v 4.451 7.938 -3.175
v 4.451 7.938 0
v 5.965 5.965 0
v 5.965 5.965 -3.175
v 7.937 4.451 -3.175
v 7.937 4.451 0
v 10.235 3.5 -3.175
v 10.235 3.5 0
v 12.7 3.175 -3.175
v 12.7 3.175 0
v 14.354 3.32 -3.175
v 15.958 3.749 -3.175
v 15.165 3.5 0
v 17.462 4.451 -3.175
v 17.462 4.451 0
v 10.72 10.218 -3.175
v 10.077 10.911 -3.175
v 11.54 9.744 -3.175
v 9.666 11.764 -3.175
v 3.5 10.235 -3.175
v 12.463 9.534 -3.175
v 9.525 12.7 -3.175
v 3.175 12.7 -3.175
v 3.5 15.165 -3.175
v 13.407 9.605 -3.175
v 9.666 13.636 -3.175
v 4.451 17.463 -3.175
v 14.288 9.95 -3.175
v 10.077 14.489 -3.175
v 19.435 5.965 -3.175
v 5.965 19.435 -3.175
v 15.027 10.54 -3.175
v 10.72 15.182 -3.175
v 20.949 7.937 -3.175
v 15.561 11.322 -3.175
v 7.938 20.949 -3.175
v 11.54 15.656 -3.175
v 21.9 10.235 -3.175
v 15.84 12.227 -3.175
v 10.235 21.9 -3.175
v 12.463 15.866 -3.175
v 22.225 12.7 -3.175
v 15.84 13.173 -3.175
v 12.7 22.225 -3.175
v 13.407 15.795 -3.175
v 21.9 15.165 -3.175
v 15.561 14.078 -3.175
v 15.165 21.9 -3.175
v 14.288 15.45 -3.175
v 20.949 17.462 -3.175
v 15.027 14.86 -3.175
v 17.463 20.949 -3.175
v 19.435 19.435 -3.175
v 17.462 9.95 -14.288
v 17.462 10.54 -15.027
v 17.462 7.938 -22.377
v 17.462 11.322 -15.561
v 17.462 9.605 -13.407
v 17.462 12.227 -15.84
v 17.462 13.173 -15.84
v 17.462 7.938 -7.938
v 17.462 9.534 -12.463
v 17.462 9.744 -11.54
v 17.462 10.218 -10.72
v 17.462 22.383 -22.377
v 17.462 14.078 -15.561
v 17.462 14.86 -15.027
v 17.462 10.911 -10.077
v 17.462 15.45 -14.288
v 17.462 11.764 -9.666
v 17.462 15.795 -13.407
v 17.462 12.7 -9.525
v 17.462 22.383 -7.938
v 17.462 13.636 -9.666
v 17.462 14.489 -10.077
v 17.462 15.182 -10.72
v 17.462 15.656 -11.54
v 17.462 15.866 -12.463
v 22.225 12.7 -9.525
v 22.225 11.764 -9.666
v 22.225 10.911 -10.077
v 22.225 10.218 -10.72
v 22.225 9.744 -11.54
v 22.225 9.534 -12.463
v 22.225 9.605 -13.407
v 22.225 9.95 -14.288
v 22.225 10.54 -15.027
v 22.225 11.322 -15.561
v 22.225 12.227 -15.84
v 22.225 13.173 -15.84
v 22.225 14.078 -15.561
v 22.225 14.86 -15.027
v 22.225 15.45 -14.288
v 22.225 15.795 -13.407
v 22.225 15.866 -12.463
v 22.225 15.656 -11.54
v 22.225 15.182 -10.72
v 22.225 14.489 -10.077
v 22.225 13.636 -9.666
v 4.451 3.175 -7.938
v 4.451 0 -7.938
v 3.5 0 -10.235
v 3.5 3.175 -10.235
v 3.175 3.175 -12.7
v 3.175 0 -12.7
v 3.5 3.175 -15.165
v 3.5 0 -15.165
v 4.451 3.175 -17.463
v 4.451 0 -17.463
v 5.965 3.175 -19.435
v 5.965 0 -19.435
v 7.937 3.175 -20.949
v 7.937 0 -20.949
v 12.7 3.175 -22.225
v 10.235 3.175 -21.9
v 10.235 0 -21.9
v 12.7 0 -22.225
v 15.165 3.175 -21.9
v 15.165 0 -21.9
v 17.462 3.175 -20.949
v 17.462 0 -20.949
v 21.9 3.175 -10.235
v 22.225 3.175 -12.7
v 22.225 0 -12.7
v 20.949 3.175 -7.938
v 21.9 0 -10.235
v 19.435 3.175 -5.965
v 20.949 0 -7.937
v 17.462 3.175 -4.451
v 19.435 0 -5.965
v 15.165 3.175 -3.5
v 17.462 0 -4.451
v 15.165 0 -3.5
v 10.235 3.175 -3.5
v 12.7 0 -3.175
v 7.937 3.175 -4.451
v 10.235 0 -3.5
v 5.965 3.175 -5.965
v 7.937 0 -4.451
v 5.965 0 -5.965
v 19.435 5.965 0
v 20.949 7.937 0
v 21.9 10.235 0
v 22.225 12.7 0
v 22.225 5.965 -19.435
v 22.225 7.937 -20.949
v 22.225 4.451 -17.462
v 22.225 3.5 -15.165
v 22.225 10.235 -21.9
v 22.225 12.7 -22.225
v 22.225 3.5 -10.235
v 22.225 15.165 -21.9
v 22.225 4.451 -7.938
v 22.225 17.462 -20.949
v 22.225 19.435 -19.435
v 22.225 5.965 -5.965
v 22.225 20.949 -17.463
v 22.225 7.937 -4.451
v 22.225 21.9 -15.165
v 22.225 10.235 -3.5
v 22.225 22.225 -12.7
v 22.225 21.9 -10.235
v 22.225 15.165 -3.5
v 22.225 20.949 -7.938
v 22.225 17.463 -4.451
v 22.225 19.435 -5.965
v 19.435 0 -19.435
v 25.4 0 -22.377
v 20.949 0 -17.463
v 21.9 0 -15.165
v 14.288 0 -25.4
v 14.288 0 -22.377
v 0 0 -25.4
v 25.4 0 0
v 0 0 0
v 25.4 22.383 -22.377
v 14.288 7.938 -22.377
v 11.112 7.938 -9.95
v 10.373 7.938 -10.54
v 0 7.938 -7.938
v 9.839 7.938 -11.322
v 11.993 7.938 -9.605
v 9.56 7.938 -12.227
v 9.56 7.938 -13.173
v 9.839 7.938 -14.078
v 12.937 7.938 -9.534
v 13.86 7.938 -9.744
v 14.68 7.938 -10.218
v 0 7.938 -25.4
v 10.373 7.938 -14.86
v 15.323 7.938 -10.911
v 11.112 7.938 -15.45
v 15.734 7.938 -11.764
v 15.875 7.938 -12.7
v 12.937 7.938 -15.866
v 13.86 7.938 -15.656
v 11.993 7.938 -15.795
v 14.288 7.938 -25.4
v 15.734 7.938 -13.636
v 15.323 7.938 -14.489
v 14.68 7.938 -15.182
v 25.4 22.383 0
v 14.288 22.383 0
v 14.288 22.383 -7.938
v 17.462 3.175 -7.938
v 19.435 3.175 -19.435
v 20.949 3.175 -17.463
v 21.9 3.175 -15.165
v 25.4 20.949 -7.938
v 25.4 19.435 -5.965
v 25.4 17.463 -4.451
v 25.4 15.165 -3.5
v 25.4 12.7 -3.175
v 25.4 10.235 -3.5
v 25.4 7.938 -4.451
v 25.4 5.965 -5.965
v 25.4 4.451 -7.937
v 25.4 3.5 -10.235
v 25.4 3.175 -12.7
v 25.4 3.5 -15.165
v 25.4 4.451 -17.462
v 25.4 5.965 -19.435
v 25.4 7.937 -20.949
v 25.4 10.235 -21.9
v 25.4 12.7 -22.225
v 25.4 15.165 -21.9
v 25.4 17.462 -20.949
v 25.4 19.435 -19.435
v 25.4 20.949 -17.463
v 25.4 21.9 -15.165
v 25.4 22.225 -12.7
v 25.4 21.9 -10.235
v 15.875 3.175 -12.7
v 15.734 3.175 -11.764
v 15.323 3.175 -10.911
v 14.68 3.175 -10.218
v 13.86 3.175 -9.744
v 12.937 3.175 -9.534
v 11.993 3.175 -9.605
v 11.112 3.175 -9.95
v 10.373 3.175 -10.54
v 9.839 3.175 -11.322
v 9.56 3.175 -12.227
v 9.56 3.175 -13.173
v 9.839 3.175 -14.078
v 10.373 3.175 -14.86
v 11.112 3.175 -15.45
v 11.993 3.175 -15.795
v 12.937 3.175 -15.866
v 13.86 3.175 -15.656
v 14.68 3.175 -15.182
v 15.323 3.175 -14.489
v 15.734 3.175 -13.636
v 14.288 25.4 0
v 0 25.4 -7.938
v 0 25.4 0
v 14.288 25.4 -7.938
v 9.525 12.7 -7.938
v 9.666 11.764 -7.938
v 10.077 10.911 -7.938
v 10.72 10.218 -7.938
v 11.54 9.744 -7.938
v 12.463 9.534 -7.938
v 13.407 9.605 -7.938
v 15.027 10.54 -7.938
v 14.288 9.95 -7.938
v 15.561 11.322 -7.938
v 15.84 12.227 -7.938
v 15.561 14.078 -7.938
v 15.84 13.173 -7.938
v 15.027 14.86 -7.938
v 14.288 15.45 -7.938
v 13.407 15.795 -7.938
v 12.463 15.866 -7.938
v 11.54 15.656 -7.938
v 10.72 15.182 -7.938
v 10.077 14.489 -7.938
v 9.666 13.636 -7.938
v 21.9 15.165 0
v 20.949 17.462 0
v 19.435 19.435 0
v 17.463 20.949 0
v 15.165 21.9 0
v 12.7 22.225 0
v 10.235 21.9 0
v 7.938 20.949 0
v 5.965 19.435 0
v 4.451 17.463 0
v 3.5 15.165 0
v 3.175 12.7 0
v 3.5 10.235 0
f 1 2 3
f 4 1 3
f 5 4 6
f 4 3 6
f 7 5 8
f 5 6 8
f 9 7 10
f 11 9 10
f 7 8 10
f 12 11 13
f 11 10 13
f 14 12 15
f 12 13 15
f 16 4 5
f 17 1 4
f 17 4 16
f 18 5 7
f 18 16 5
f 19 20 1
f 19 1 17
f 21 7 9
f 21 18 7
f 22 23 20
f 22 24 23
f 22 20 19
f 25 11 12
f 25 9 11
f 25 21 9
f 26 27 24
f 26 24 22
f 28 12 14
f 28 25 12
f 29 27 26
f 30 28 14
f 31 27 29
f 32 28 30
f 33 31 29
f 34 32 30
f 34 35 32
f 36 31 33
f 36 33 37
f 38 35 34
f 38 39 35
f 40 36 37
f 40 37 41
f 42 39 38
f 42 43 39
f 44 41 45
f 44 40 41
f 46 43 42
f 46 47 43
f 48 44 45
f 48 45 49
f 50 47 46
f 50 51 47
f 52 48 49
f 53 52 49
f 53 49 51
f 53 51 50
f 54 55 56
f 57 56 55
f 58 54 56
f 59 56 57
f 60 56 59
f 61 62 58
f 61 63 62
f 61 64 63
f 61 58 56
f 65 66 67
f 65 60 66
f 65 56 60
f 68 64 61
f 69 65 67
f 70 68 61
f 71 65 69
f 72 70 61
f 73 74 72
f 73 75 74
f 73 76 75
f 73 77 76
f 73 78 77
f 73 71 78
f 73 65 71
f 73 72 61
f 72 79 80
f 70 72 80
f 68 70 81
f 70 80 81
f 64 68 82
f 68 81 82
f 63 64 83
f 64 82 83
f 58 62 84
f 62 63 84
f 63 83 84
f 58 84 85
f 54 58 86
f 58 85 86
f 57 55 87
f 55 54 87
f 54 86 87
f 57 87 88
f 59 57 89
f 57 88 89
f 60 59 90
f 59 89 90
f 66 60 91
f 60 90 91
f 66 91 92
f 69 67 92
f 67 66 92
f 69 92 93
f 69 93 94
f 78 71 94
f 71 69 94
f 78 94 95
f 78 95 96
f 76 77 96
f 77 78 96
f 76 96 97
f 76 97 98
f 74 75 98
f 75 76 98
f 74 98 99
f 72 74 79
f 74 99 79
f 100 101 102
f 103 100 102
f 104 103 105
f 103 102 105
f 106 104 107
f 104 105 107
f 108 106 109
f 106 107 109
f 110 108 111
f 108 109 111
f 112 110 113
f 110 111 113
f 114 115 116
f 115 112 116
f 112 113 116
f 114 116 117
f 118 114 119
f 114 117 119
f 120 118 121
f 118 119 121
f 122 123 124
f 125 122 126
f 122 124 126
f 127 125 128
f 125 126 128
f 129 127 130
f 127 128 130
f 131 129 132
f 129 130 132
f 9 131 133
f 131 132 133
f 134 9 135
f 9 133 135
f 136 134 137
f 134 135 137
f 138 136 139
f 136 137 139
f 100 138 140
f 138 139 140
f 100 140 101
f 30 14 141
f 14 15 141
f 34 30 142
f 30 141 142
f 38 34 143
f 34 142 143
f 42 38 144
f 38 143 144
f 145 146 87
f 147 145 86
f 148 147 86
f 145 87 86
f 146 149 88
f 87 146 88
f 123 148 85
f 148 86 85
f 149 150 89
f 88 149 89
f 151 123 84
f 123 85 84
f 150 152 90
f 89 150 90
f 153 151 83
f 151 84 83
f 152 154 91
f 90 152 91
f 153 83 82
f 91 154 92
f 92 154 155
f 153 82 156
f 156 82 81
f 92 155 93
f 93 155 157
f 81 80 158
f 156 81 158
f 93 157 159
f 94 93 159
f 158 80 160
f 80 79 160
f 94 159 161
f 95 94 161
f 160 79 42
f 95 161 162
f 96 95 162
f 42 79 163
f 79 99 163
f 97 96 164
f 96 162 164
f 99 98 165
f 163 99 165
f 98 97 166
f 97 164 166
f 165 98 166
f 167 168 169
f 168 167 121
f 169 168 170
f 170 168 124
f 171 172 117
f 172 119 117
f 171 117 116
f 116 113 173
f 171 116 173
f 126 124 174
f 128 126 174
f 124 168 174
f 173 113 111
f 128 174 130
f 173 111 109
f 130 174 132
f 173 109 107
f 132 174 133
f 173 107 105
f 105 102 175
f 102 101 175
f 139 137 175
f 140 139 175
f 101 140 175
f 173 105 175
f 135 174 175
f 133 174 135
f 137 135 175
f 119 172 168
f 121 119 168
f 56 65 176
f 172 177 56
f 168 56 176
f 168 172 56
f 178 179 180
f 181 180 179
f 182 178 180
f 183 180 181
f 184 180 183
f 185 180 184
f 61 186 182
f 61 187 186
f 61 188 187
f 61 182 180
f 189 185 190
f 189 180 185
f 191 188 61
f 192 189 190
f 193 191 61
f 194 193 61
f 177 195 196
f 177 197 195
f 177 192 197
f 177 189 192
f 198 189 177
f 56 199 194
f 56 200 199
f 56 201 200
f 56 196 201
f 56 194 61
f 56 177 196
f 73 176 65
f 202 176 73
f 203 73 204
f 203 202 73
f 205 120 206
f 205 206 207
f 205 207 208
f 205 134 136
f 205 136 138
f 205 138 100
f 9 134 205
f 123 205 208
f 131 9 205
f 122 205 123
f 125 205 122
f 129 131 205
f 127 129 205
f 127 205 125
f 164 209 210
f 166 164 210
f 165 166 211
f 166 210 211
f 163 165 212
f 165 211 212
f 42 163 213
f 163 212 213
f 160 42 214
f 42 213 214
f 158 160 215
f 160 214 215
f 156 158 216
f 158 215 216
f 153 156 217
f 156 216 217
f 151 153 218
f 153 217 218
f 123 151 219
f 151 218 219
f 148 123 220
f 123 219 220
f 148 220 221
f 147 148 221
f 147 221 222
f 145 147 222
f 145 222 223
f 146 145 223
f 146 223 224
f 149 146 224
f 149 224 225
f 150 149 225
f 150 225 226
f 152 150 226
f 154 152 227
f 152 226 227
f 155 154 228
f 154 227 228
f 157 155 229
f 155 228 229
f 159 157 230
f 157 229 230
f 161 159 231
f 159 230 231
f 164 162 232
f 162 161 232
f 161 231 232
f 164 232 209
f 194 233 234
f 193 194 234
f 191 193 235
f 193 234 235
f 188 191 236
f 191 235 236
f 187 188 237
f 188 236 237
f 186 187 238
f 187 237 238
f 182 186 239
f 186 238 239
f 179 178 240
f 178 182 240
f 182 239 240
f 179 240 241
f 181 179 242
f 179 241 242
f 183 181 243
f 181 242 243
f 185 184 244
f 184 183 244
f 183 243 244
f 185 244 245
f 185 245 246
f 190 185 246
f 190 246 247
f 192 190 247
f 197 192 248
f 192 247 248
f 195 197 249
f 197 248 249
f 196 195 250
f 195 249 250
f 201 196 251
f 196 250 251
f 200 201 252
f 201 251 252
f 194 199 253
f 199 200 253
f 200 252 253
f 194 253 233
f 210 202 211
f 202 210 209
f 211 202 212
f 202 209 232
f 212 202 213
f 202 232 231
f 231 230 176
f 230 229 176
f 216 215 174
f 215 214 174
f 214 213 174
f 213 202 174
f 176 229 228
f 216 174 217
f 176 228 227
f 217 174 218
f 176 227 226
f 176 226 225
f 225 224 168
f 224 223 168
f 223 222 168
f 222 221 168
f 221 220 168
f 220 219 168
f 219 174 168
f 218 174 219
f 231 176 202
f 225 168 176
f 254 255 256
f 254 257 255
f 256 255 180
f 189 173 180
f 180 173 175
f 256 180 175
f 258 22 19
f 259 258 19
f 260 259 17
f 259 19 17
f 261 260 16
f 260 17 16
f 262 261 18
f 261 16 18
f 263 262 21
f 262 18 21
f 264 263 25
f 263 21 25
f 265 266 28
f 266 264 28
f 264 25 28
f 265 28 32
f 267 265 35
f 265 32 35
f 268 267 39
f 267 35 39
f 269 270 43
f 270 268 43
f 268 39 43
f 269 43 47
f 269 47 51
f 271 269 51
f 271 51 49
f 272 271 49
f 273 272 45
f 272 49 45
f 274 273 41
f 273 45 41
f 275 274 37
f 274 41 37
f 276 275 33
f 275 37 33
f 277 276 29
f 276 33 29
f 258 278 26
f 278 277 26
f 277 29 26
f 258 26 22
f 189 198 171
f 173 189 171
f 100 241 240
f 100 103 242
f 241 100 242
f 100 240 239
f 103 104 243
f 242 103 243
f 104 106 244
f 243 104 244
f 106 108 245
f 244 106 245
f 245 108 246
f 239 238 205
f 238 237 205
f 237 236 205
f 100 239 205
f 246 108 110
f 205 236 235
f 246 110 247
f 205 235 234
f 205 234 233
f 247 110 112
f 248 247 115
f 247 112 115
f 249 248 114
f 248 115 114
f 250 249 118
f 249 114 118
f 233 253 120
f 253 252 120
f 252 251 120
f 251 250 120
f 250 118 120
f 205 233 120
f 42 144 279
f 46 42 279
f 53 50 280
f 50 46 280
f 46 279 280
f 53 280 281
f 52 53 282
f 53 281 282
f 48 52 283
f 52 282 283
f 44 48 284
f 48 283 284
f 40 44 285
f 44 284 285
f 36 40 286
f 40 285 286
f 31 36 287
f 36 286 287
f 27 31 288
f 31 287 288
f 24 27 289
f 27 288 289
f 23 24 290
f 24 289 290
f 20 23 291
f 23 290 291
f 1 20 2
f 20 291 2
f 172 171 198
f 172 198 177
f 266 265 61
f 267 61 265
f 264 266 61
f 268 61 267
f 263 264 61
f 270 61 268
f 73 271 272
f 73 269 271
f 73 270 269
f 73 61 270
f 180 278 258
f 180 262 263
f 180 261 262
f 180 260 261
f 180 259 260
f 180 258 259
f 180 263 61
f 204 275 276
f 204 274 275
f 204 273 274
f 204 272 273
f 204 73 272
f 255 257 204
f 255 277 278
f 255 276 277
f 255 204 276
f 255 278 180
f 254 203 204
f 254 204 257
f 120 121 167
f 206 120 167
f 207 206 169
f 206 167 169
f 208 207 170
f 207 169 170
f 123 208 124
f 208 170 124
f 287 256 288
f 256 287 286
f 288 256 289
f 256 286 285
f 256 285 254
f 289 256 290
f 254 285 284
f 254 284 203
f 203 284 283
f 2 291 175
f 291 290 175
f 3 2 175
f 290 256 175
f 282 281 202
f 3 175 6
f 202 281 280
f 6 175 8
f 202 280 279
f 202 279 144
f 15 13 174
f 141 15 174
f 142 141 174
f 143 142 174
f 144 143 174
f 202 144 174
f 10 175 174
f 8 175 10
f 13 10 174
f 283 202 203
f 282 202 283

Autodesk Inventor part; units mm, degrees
ref_plane "YZ Plane" through (0, 0, 0) normal (1, 0, 0) x (0, 1, 0)
ref_plane "XZ Plane" through (0, 0, 0) normal (0, 1, 0) x (-1, 0, 0)
ref_plane "XY Plane" through (0, 0, 0) normal (0, 0, 1) x (1, 0, 0)
sketch "Sketch1" plane through (0, 0, 0) normal (0, 1, 0) x (-1, 0, 0)
  line L0 (0, 0) -> (-25.4, 0)
  line L1 (-25.4, 0) -> (-25.4, -25.4)
  line L2 (-25.4, -25.4) -> (0, -25.4)
  line L3 (0, -25.4) -> (0, 0)
  line L4 (0, 0) -> (-25.4, -25.4) construction
  line L5 (-25.4, 0) -> (0, -25.4) construction
  circle A0 centre (-12.7, -12.7) radius 9.525
  dimension "d0" = 25.4
  dimension "d1" = 25.4
  dimension "d3" = 19.05
extrude "Extrusion1" add sketch "Sketch1" along normal blind 3.175
sketch "Sketch2" plane through (0, 3.175, 0) normal (0, 1, 0) x (1, 0, 0)
  line L0 (25.4, 25.4) -> (0, 25.4) projected
  line L1 (0, 0) -> (25.4, 0)
  line L2 (25.4, 0) -> (25.4, 25.4)
  line L3 (25.4, 25.4) -> (0, 25.4)
  line L4 (0, 25.4) -> (0, 0)
  line L5 (0, 25.4) -> (0, 0) construction
  line L6 (0, 0) -> (25.4, 25.4) construction
  line L7 (0, 25.4) -> (25.4, 0) construction
  circle A0 centre (12.7, 12.7) radius 3.175
  dimension "d39" = 6.35
extrude "Extrusion2" add sketch "Sketch2" along normal blind 4.7625
sketch "Sketch4" plane through (0, 0, 0) normal (0, 0, 1) x (1, 0, 0)
  line L0 (0, 0) -> (0, 7.9375) projected
  line L1 (0, 0) -> (25.4, 0)
  line L2 (25.4, 0) -> (25.4, 25.4)
  line L3 (25.4, 25.4) -> (0, 25.4)
  line L4 (0, 25.4) -> (0, 0)
  line L5 (0, 25.4) -> (25.4, 0) construction
  line L6 (25.4, 25.4) -> (0, 0) construction
  circle A0 centre (12.7, 12.7) radius 9.525
  dimension "d13" = 25.4
  dimension "d14" = 25.4
  dimension "d15" = 19.05
extrude "Extrusion4" add sketch "Sketch4" against normal blind 3.175
sketch "Sketch5" plane through (0, 0, 0) normal (0, 0, 1) x (1, 0, 0)
  line L0 (0, 0) -> (0, 25.4) construction
  line L1 (0, 0) -> (25.4, 0) construction
  line L2 (0, 25.4) -> (25.4, 0) construction
  line L3 (0, 25.4) -> (25.4, 25.4) construction
  line L4 (25.4, 0) -> (25.4, 25.4) construction
  line L5 (0, 0) -> (0, 7.9375) construction
  line L6 (25.4, 25.4) -> (0, 0) construction
  circle A0 centre (12.7, 12.7) radius 9.525
  dimension "d18" = 19.05
extrude "Extrusion5" cut sketch "Sketch5" against normal blind 3.175
sketch "Sketch6" plane through (0, 0, -3.175) normal (0, 0, -1) x (-1, 0, 0)
  line L0 (-25.4, 0) -> (-25.4, 25.4) projected
  line L1 (-25.4, 25.4) -> (0, 25.4)
  line L2 (0, 25.4) -> (0, 0)
  line L3 (0, 0) -> (-25.4, 0)
  line L4 (-25.4, 0) -> (-25.4, 25.4)
  line L5 (0, 0) -> (0, 25.4) construction
  line L6 (-25.4, 25.4) -> (0, 0) construction
  line L7 (0, 0) -> (0, 25.4) construction
  line L8 (0, 25.4) -> (-25.4, 0) construction
  circle A0 centre (-12.7, 12.7) radius 3.175
  dimension "d40" = 6.35
extrude "Extrusion6" add sketch "Sketch6" along normal blind 4.7625
sketch "Sketch7" plane through (25.4, 0, 0) normal (1, 0, 0) x (0, 0, -1)
  line L0 (0, 25.4) -> (7.9375, 25.4) projected
  line L1 (25.4, 0) -> (25.4, 7.9375) projected
  line L2 (0, 25.4) -> (25.4, 25.4)
  line L3 (25.4, 25.4) -> (25.4, 0)
  line L4 (25.4, 0) -> (0, 0)
  line L5 (0, 0) -> (0, 25.4)
  line L6 (0, 25.4) -> (25.4, 0) construction
  line L7 (25.4, 25.4) -> (0, 0) construction
  circle A0 centre (12.7, 12.7) radius 9.525
  dimension "d24" = 19.05
extrude "Extrusion7" add sketch "Sketch7" against normal blind 3.175
sketch "Sketch8" plane through (25.4, 0, 0) normal (1, 0, 0) x (0, 0, -1)
  line L0 (0, 0) -> (0, 25.4) construction
  line L1 (0, 0) -> (25.4, 0) construction
  line L2 (0, 25.4) -> (25.4, 0) construction
  line L3 (25.4, 0) -> (25.4, 25.4) construction
  line L4 (25.4, 25.4) -> (0, 0) construction
  circle A0 centre (12.7, 12.7) radius 9.525
  dimension "d27" = 19.05
extrude "Extrusion8" cut sketch "Sketch8" against normal blind 3.175
sketch "Sketch9" plane through (22.225, 0, 0) normal (-1, 0, 0) x (0, 0, 1)
  line L0 (-25.4, 25.4) -> (-25.4, 7.9375) projected
  line L1 (-25.4, 25.4) -> (0, 25.4)
  line L2 (0, 25.4) -> (0, 0)
  line L3 (0, 0) -> (-25.4, 0)
  line L4 (-25.4, 0) -> (-25.4, 25.4)
  line L5 (-25.4, 0) -> (0, 0) construction
  line L6 (-25.4, 25.4) -> (0, 0) construction
  line L7 (0, 0) -> (0, 25.4) construction
  line L8 (0, 25.4) -> (-25.4, 0) construction
  circle A0 centre (-12.7, 12.7) radius 3.175
  dimension "d41" = 6.35
extrude "Extrusion9" add sketch "Sketch9" along normal blind 4.7625
sketch "Sketch10" plane through (0, 0, 0) normal (0, -1, 0) x (1, 0, 0)
  line L0 (0, -25.4) -> (0, -7.9375) projected
  line L1 (25.4, 0) -> (0, 0) projected
  line L2 (0, -25.4) -> (25.4, -25.4)
  line L3 (25.4, -25.4) -> (25.4, 0)
  line L4 (25.4, 0) -> (0, 0)
  line L5 (0, 0) -> (0, -25.4)
  line L6 (17.4625, -25.4) -> (0, -25.4) construction
  line L7 (25.4, 0) -> (25.4, -25.4) construction
  line L8 (0, -25.4) -> (25.4, 0) construction
  line L9 (25.4, 0) -> (0, 0) construction
  line L10 (0, -25.4) -> (0, 0) construction
  line L11 (0, 0) -> (25.4, -25.4) construction
  circle A0 centre (12.7, -12.7) radius 9.525
  dimension "d33" = 19.05
extrude "Extrusion10" cut sketch "Sketch10" against normal blind 3.175 contours A0
sketch "Sketch11" plane through (0, 0, 0) normal (0, 0, 1) x (1, 0, 0)
  line L0 (0, 7.9375) -> (0, 25.4) construction
  line L1 (25.4, 0) -> (25.4, 25.4) construction
  line L2 (0, 25.4) -> (25.4, 0) construction
  line L3 (25.4, 0) -> (25.4, 25.4) construction
  line L4 (25.4, 25.4) -> (0, 0) construction
  circle A0 centre (12.7, 12.7) radius 9.525
  dimension "d36" = 19.05
extrude "Extrusion11" cut sketch "Sketch11" against normal blind 3.175
sketch "Sketch12" plane through (0, 0, 0) normal (0, 0, 1) x (1, 0, 0)
  line L0 (12.7, 22.3828) -> (25.4, 22.3828) construction
  line L1 (0, 25.4) -> (17.4625, 25.4) projected
  line L2 (25.4, 22.3828) -> (14.2875, 22.3828)
  line L3 (14.2875, 22.3828) -> (14.2875, 25.4)
  line L4 (14.2875, 25.4) -> (25.4, 25.4)
  line L5 (25.4, 25.4) -> (25.4, 22.3828)
  point P0 (0, 0)
  dimension "d42" = 11.1125
extrude "Extrusion12" cut sketch "Sketch12" against normal blind 25.4
sketch "Sketch13" plane through (0, 0, 0) normal (0, -1, 0) x (1, 0, 0)
  line L0 (17.4625, -25.4) -> (25.4, -25.4) projected
  line L1 (25.4, -25.4) -> (14.2875, -25.4)
  line L2 (14.2875, -25.4) -> (14.2875, -22.3774)
  line L3 (14.2875, -22.3774) -> (25.4, -22.3774)
  line L4 (25.4, -22.3774) -> (25.4, -25.4)
  point P0 (0, 0)
  dimension "d45" = 11.1125
  dimension "d46" = 3.0226
extrude "Extrusion13" cut sketch "Sketch13" against normal blind 25.4
properties part number "MountingBracket_4"
